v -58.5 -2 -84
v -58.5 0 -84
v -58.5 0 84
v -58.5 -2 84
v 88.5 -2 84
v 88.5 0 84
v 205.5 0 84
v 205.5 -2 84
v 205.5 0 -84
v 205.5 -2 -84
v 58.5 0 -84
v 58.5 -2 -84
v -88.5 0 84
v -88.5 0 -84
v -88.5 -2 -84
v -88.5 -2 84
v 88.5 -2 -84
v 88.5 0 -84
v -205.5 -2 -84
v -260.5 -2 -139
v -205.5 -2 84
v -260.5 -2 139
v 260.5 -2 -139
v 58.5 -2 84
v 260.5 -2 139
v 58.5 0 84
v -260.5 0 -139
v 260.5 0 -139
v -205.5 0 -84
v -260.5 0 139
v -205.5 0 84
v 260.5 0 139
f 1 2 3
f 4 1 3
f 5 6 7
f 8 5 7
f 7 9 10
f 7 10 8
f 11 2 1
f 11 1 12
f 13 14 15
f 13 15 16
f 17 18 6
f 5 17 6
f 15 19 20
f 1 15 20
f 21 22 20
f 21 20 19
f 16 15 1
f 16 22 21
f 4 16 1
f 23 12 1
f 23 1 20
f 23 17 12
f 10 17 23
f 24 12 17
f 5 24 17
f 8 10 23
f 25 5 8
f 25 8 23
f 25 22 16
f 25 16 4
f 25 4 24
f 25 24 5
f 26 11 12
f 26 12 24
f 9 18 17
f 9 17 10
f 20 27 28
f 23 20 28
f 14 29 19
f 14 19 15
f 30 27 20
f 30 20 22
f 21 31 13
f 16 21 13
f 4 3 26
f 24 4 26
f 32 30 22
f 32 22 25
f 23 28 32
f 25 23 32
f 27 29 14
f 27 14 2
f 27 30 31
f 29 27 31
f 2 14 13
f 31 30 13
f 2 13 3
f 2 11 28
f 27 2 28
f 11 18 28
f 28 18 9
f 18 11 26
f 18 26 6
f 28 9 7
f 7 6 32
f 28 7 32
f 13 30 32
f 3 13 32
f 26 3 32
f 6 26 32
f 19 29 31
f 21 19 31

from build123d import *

# Parameters (mm, degrees)
F0_W     = 521
F0_H     = 278
F0_W_2   = 117
F0_H_2   = 168
F1_DEPTH = 2


with BuildPart() as f1:
    # F0 (on Front) → F1 (new body)
    with BuildSketch(Plane.XZ):
        Rectangle(F0_W, F0_H)
        with Locations((-147, 0)):
            Rectangle(F0_W_2, F0_H_2, mode=Mode.SUBTRACT)
        Rectangle(F0_W_2, F0_H_2, mode=Mode.SUBTRACT)
        with Locations((147, 0)):
            Rectangle(F0_W_2, F0_H_2, mode=Mode.SUBTRACT)
    extrude(amount=F1_DEPTH)


solid = f1.part
